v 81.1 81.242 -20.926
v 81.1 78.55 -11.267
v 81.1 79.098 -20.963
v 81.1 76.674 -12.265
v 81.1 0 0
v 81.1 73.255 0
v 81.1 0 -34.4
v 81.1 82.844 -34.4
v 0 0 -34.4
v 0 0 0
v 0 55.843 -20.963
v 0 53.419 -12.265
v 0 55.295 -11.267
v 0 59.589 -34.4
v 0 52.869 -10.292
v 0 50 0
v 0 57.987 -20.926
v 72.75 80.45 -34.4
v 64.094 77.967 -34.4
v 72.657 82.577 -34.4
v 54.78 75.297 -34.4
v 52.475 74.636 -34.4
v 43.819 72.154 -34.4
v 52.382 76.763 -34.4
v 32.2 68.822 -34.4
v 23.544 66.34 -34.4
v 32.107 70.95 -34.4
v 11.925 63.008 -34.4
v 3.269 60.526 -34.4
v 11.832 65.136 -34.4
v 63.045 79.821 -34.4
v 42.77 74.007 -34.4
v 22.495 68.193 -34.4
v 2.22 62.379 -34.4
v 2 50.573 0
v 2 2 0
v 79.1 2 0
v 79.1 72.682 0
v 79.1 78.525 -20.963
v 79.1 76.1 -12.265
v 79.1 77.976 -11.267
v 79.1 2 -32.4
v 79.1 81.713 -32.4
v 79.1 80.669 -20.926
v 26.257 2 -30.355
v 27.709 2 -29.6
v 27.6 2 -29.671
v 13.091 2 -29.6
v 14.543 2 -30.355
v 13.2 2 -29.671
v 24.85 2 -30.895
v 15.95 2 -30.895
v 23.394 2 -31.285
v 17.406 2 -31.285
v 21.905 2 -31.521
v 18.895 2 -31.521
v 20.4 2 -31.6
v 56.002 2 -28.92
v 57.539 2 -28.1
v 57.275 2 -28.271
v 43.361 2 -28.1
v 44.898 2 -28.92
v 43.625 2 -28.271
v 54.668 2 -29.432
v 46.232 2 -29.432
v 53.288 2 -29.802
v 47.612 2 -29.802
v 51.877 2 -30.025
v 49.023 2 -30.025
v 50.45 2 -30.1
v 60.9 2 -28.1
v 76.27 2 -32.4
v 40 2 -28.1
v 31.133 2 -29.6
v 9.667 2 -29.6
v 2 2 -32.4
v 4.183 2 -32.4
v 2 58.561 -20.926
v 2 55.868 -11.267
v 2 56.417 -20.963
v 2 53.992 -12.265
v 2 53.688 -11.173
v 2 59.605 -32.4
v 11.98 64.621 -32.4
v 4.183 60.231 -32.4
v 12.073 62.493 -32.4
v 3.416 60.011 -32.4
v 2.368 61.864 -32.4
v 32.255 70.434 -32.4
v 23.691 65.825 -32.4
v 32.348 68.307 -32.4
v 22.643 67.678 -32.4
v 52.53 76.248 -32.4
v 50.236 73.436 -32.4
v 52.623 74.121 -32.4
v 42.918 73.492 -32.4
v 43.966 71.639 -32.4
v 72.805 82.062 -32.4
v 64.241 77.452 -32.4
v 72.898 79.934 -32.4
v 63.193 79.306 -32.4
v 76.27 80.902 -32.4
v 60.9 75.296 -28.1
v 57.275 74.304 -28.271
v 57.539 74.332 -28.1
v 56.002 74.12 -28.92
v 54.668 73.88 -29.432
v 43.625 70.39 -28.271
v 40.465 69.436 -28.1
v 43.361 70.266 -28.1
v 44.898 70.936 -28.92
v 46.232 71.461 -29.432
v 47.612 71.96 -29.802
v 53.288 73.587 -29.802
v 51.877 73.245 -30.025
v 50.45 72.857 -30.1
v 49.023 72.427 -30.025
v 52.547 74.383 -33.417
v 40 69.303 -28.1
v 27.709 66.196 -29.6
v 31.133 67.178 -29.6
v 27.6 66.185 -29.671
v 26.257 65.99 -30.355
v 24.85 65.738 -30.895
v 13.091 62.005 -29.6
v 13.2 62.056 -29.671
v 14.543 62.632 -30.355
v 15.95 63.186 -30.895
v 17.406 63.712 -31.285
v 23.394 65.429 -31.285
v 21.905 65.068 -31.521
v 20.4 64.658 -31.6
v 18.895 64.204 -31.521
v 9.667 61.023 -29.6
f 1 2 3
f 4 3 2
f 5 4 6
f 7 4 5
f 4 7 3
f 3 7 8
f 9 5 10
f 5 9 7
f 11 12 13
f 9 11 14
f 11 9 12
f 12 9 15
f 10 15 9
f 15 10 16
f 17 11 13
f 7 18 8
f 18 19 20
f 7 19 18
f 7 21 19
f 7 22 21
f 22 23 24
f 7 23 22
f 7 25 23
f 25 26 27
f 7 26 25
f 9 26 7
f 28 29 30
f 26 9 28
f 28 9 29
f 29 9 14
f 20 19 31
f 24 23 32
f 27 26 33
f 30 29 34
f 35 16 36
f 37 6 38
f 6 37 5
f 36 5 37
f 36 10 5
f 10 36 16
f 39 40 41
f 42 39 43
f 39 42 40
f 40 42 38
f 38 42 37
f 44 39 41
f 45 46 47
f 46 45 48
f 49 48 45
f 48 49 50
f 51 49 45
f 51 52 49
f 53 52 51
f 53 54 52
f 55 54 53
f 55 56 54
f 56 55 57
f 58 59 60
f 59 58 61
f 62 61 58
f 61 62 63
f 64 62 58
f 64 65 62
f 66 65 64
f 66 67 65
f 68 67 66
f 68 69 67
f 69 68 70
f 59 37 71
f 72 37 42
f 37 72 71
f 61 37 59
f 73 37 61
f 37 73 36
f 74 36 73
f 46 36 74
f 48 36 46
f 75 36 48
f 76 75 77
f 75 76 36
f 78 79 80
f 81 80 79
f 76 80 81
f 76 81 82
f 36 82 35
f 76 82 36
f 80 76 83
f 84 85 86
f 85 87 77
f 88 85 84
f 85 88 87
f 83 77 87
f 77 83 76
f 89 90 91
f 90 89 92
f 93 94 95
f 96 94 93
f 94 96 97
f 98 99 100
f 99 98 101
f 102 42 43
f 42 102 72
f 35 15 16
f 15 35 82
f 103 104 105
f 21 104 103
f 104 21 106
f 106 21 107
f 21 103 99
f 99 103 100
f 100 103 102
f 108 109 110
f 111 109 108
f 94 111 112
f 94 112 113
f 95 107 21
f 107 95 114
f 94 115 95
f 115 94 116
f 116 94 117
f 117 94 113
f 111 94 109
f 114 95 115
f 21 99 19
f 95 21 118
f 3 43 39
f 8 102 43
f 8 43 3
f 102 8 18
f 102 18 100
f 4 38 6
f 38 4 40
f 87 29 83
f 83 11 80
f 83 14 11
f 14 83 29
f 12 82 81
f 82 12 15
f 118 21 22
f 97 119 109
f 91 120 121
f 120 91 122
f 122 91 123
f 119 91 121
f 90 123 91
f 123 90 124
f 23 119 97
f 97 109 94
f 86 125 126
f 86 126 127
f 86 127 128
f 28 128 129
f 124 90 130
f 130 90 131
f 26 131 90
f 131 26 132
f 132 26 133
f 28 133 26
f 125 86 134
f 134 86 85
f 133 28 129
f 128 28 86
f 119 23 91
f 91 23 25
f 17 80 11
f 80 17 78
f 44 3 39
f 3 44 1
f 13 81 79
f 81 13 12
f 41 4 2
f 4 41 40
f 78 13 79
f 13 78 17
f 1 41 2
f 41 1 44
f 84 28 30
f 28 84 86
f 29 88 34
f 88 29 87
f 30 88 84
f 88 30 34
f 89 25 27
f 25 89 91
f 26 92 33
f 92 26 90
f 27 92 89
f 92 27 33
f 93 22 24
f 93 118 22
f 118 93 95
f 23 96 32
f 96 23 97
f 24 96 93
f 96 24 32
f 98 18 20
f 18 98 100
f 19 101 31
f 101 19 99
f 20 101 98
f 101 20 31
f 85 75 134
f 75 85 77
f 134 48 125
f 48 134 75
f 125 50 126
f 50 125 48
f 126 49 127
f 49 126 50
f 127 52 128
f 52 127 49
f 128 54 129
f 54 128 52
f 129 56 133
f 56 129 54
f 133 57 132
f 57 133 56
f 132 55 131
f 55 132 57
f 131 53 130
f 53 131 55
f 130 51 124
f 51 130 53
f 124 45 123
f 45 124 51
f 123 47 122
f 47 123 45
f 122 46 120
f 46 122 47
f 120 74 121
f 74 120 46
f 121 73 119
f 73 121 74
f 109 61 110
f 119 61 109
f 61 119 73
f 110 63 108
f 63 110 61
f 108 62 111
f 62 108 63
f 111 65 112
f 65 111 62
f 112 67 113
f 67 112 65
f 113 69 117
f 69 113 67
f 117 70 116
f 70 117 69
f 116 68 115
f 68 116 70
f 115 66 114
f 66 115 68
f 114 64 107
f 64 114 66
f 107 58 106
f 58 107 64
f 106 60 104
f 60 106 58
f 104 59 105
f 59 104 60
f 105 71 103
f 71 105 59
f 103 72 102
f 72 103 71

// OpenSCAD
/* [General] */

// Choose a currency you use.
currency = "other"; // [usd:USD - US dollar, eur:EUR - Euro, chf:CHF - Swiss franc, cad:CAD - Canadian dollar, thb:THB - Thai Baht, other:Other (See "Slot customization" tab above)]

// How tall is the the shortest tube? In millimeters:
height = 50; // [10:150]

// Choose a pattern for the back side.
pattern = "no"; // [no:Solid without pattern, chncoin:Chinese ancient coin pattern, mesh:Mesh pattern]

// Would you like Tom-and-Jerry pictures on the left side and right side? (Not fully supported; may only work with OpenSCAD version 2014.09 ~ 2014.12.)
image = 0; //// [1:Yes please, 0:No thanks]

// Which one would you like to see?
part = "basebox"; // [all:All these three parts assembled together,all_unassembled:All these three parts unassembled,basebox:Base box only,topboard:Top board only,tubes:Tubes only]

/* [Slot customization] */

// In this tab you're able to customize your coins. Here below, you may have up to 10 slots, each for one kind of coin. For each slot you're going to define it's diameter and thickness. Note that the coins should be ordered from biggest to smallest in diameter. You may want to collect information about the diameters and thicknesses of your coins from wikipedia before you continue.
understand = 1; // [1:Yes I understand,0:Yes I said understand]

// in millimeters. For the first (and biggest) coin.
coin_1_diameter = 28;
// in millimeters.
coin_1_thickness = 1.8;
// The second coin. Remember: this 2nd coin should always be smaller than the 1st coin.
coin_2_diameter = 26.50;
coin_2_thickness = 1.75;
// The 3rd coin.
coin_3_diameter = 0;
coin_3_thickness = 0;
// 4th coin.
coin_4_diameter = 0;
coin_4_thickness = 0;
// 5th coin. If you don't need more coins, simply set the remaining to 0.
coin_5_diameter = 0;
coin_5_thickness = 0;
// 6th coin.
coin_6_diameter = 0;
coin_6_thickness = 0;
// 7th coin.
coin_7_diameter = 0;
coin_7_thickness = 0;
// 8th coin.
coin_8_diameter = 0;
coin_8_thickness = 0;
// 9th coin.
coin_9_diameter = 0;
coin_9_thickness = 0;
// 10th coin.
coin_10_diameter = 0;
coin_10_thickness = 0;

/* [Hidden] */

usd_coins = [[30.61, 26.50, 24.26, 21.21, 19.05, 17.91],
             [ 2.15,  2.00,  1.75,  1.95,  1.55,  1.35]];
eur_coins = [[25.75, 24.25, 23.25, 22.25, 21.25, 19.75, 18.75, 16.25],
             [ 2.20,  2.38,  2.33,  2.14,  1.67,  1.93,  1.67,  1.67]];
chf_coins = [[31.45, 27.40, 23.20, 21.05, 19.15, 18.20, 17.15],
             [ 2.35,  2.15,  1.15,  1.65,  1.45,  1.25,  1.25]];
cad_coins = [[28.00, 27.13, 26.50, 23.88, 21.20, 19.05, 18.03],
             [ 1.80,  1.95,  1.75,  1.58,  1.76,  1.45,  1.22]];
thb_coins = [[26.00, 24.05, 22.05, 20.01],
             [ 2.16,  2.13,  1.48,  1.38]];

other_coins_d_t = [
  [coin_1_diameter, coin_1_thickness], [coin_2_diameter, coin_2_thickness],
  [coin_3_diameter, coin_3_thickness], [coin_4_diameter, coin_4_thickness],
  [coin_5_diameter, coin_5_thickness], [coin_6_diameter, coin_6_thickness],
  [coin_7_diameter, coin_7_thickness], [coin_8_diameter, coin_8_thickness],
  [coin_9_diameter, coin_9_thickness], [coin_10_diameter, coin_10_thickness]];

other_coins = [[for (i=other_coins_d_t) if(i[0] > 0) i[0]],
               [for (i=other_coins_d_t) if(i[0] > 0) i[1]]];


//  .88b  d88.   .d8b.   d888888b  d8b   db
//  88'YbdP`88  d8' `8b    `88'    888o  88
//  88  88  88  88ooo88     88     88V8o 88
//  88  88  88  88~~~88     88     88 V8o88
//  88  88  88  88   88    .88.    88  V888
//  YP  YP  YP  YP   YP  Y888888P  VP   V8P

coins = currency == "usd" ? usd_coins :
        currency == "eur" ? eur_coins :
        currency == "chf" ? chf_coins :
        currency == "cad" ? cad_coins :
        currency == "thb" ? thb_coins : other_coins;

coins_d = coins[0];
coins_thickness = coins[1];

enable_box = (part == "all" || part == "all_unassembled" || part == "basebox");
  enable_dovetail = true;
  enable_box_emptier = false;
  enable_mesh = (pattern != "no");
  enable_image = (image == 1);
enable_top_board = (part == "all" || part == "all_unassembled" || part == "topboard");
enable_tubes = (part == "all" || part == "all_unassembled" || part == "tubes");
  enable_tube_scale = true;
  enable_tube_emptier = false;
  inspect_tube_inside = false;
assembled = (part != "all_unassembled");
lay_flat = (part != "all" && part != "all_unassembled");

sorter_min_height = height;
board_thickness = 2.0;
board_left_padding = 2;
board_right_padding = 13;
board_primary_slope = 16;
board_secondary_slope = 15;
horizontal_guard_width = 3;
coin_padding = 0.4;
coin_padding_top_board = 0.25;
nozzle_size = 0.4;
nozzle_size_upbound = 0.41;

dovetail_count = 4;
dovetail_back_max_width = 10;
dovetail_back_min_width = 9;
dovetail_side_max_width = 10;
dovetail_side_min_width = 9;
dovetail_femail_margin = 0.5;

image_left_size = 25;
image_right_size = 30;
image_dir = "";

tubes_shorter = 5;
tubes_front_back_cut = 2;
tubes_base_thickness = 4.0;
tubes_back_thinner = 1;
tubes_scale_depth = 0.4;
tubes_scale_height = 0.8;

unassembled_top_board_lift = 25;
unassembled_tubes_lift = 20;

$fa = 6;  // default: 12
$fs = 1;  // default: 2

coin_count = len(coins_d);
coin_max_index = coin_count - 1;

board_length = (board_left_padding + board_right_padding
                + sum_coins_d()
                + coin_padding * coin_count * 2
                + board_thickness * (coin_count + 3));

board_width = coins_d[0] + coin_padding + board_thickness * 3;

slope_height = tan(board_secondary_slope) * board_width
               + tan(board_primary_slope) * board_length;

sorter_max_height = sorter_min_height + slope_height + board_thickness;
echo("board_length:", board_length);
echo("board_width:", board_width);
echo("sorter_min_height:", sorter_min_height);
echo("sorter_max_height:", sorter_max_height);

main();

module main() {
  top_board_lift = assembled ? 0 : unassembled_top_board_lift;
  tubes_lift = assembled ? 0 : unassembled_tubes_lift;
  if (lay_flat) {
    main_impl_flat(top_board_lift, tubes_lift);
  } else {
    main_impl(top_board_lift, tubes_lift);
  }
}
module main_impl(top_board_lift=0, tubes_lift=0) {
  if (enable_box) {
    base_box();
  }
  if (enable_top_board) {
    translate([0, 0, top_board_lift]) top_board();
  }
  if (enable_tubes) {
    translate([0, 0, tubes_lift]) tubes();
  }
}
module main_impl_flat(top_board_lift=0, tubes_lift=0) {
  if (enable_box) {
    rotate([-90, 0, 0]) base_box();
  }
  if (enable_top_board) {
    translate([0, 0, top_board_lift])
    untransform_top_board(sorter_min_height)
    top_board();
  }
  if (enable_tubes) {
    translate([0, 0, tubes_lift]) tubes();
  }
}


//  d8888b.  .d8b.  .d8888. d88888b      d8888b.  .d88b.  db    db
//  88  `8D d8' `8b 88'  YP 88'          88  `8D .8P  Y8. `8b  d8'
//  88oooY' 88ooo88 `8bo.   88ooooo      88oooY' 88    88  `8bd8'
//  88~~~b. 88~~~88   `Y8b. 88~~~~~      88~~~b. 88    88  .dPYb.
//  88   8D 88   88 db   8D 88.          88   8D `8b  d8' .8P  Y8.
//  Y8888P' YP   YP `8888Y' Y88888P      Y8888P'  `Y88P'  YP    YP

// Component: the box.
module base_box() {
  render(convexity=2)
  difference() {
    union() {
      box_empty();
    }
    if (enable_image) {
      image_left_subtraction();
      image_right_subtraction();
    }
    if (enable_mesh) {
      board_back_hollow(board_thickness * 1.5);
    }
    if (enable_box_emptier) {
      board_left_hollow(fatter=board_thickness * 1.5,
                        thicker=-nozzle_size_upbound * 2);
      board_right_hollow(fatter=board_thickness * 1.5,
                         thicker=-nozzle_size_upbound * 2);
      board_bottom_hollow(fatter=board_thickness * 2,
                          thicker=-nozzle_size_upbound * 2);
    }
  }

  if (enable_dovetail) {
    base_box_dovetails();
  }

  if (enable_image) {
    image_left();
    image_right();
  }

  if (enable_mesh) {
    intersection() {
      board_back_mesh();
      union() {
        board_back_hollow();
        box_back_fill();
      }
    }
  } else {
    box_back_fill();
  }
}

function box_size(fatter=0, thicker=0, altitude=0, fronter=0, taller=0) =
  [board_length + fatter*2 + thicker*2,
   board_width + fatter*2 + thicker*2 + fronter,
   sorter_max_height + fatter*2 + thicker*2 + taller];

module box_move(fatter=0, thicker=0, altitude=0, fronter=0, taller=0) {
  translate([-fatter-thicker,
             -fatter-thicker-fronter,
             altitude-fatter-thicker]) {
    children();
  }
}

module box_empty() {
  cut_top_side() {
    box_empty_tall();
  }
}
module box_empty_tall(fatter=0, thicker=0, altitude=0) {
  difference() {
    box_outer_solid_tall(fatter, thicker, altitude);
    box_inner_solid_tall(fatter, thicker, altitude);
  }
}
module box_outer_solid_tall(fatter=0, thicker=0, altitude=0,
                            fronter=0, taller=0) {
  box_move(fatter, thicker, altitude, fronter, taller) {
    cube(box_size(fatter, thicker, altitude, fronter, taller));
  }
}
module box_inner_solid_tall(fatter=0, thicker=0, altitude=0) {
  box_outer_solid_tall(
      fatter - board_thickness - thicker, thicker, altitude,
      board_thickness + thicker + 0.1,
      board_thickness + thicker + 0.1);
}

module board_back_hollow(thicker=0) {
  xyz = box_size(fatter = -board_thickness - thicker);
  cut_top_side(altitude = -thicker)
  box_move(fatter = -board_thickness - thicker)
  translate([0, xyz[1] + thicker/2, 0]) {
    cube([xyz[0], board_thickness + thicker, xyz[2]]);
  }
}
module box_back_fill(thicker=0) {
  cut_top_side(altitude = -thicker) {
    box_back_fill_tall();
  }
}
module box_back_fill_tall() {
  linear_extrude(height=sorter_max_height, center=false, convexity=2)
  translate([0, coin_padding*2])
  difference() {
    polygon(tube_cut_back_complete());
    for (i = [0 : coin_max_index]) {
      coin_hole_plain(i);
    }
  }
}

module board_left_hollow(fatter=0, thicker=0) {
  xyz = box_size(fatter = -board_thickness - fatter);
  cut_top_side(altitude = -fatter)
  box_move(fatter = -board_thickness - fatter)
  translate([-board_thickness - fatter - thicker/2, 0, 0]) {
    cube([board_thickness + thicker, xyz[1], xyz[2]]);
  }
}

module board_right_hollow(fatter=0, thicker=0) {
  xyz = box_size(fatter = -board_thickness - fatter);
  cut_top_side(altitude = -fatter)
  box_move(fatter = -board_thickness - fatter)
  translate([xyz[0] + fatter - thicker/2, 0, 0]) {
    cube([board_thickness + thicker, xyz[1], xyz[2]]);
  }
}

module board_bottom_hollow(fatter=0, thicker=0) {
  xyz = box_size(fatter = -board_thickness - fatter);
  box_move(fatter = -board_thickness - fatter)
  translate([0, 0, -board_thickness - fatter - thicker/2]) {
    cube([xyz[0], xyz[1], board_thickness + thicker]);
  }
}

// Transformation: cut the right, left, back and front side.
module cut_sides(fatter=0, thicker=0) {
  intersection() {
    union() {
      children();
    }
    box_outer_solid_tall(fatter, thicker, taller=sorter_max_height);
  }
}

module cut_top_side(fatter=0, thicker=0, altitude=0) {
  difference() {
    union() {
      children();
    }
    top_side(sorter_min_height + fatter + altitude);
  }
}


//  d888888b .88b  d88.  d888b        dD  .88b  d88. d88888b .d8888. db   db
//    `88'   88'YbdP`88 88' Y8b      d8'  88'YbdP`88 88'     88'  YP 88   88
//     88    88  88  88 88          d8'   88  88  88 88ooooo `8bo.   88ooo88
//     88    88  88  88 88  ooo    d8'    88  88  88 88~~~~~   `Y8b. 88~~~88
//    .88.   88  88  88 88. ~8~   d8'     88  88  88 88.     db   8D 88   88
//  Y888888P YP  YP  YP  Y888P   C8'      YP  YP  YP Y88888P `8888Y' YP   YP

module image_left() {
  translate([0, (board_width - image_left_size) / 2,
             sorter_min_height * 0.4 - image_left_size / 2]) {
    translate([1, image_left_size, image_left_size])
    rotate([0, -90, 0])
    rotate([0, 0, -90])
    mirror([0, 1, 0])
    resize([image_left_size, image_left_size, 1]) {
      surface(file = str(image_dir, "TomHead_gray.1.dat"), convexity = 2);
    }

    translate([0, image_left_size-0.1, 0]) {
      cube([1, (board_width - image_left_size) / 2 - board_thickness,
            image_left_size]);
    }
  }
}

module image_left_subtraction() {
  translate([0,
             (board_width - image_left_size) / 2 + 0.01,
             sorter_min_height * 0.4 - image_left_size / 2 + 0.01]) {
    cube([0.99, image_left_size - 0.02, image_left_size - 0.02]);
  }
}

module image_right() {
  translate([board_length - 1,
             (board_width - image_right_size) / 2,
             sorter_max_height * 0.37 - image_right_size / 2]) {
    translate([0, 0, image_right_size])
    rotate([0, 90, 0])
    rotate([0, 0, 90])
    mirror([0, 1, 0])
    resize([image_right_size, image_right_size, 1]) {
      surface(file = str(image_dir, "Jerry_bw.dat"), convexity = 2);
    }

    translate([0, image_right_size-0.1, 0]) {
      cube([1, (board_width - image_right_size) / 2 - board_thickness,
            image_right_size]);
    }
  }
}

module image_right_subtraction() {
  translate([board_length - 0.99,
             (board_width - image_right_size) / 2 + 0.01,
             sorter_max_height * 0.37 - image_right_size / 2 + 0.01]) {
    cube([1, image_right_size - 0.02, image_right_size - 0.02]);
  }
}

module board_back_mesh() {
  diag_len = sqrt(board_length * board_length +
                  sorter_max_height*sorter_max_height);

  if (pattern == "mesh") {
    board_back_mesh_grids(
        nozzle_size_upbound, 15, ceil(diag_len / 15) + 1, 45,
        [board_length / 2, board_width * 0.7, sorter_max_height / 2],
        "y", board_width);

  } else if (pattern == "chncoin") {
    board_back_mesh_ancient_coins(
        nozzle_size_upbound, 18, ceil(diag_len / 18 / 2) + 2,
        [board_length / 2, board_width * 0.7, sorter_max_height / 2],
        "y", board_width);
  }
}

module mesh_extrude(
    center=[0,0,0], normal_direction="z", height=10, convexity=10) {
  translate(center) {
    rotate(normal_direction=="x" ? [0,90,0] :
           normal_direction=="y" ? [-90,0,0] : [0,0,0]) {
      linear_extrude(height, center=true, convexity=convexity) {
        children();
      }
    }
  }
}

module board_back_mesh_grids(
    thickness, gap, count, rotate_angle=0,
    center=[0,0,0], normal_direction="z", height=10) {
  length = (thickness + gap) * (count - 1) + thickness;
  mesh_extrude(center, normal_direction, height, convexity=3)
  rotate([0, 0, rotate_angle])
  translate([-length/2, -length/2]) {
    for (i = [0 : count - 1]) {
      translate([(thickness + gap) * i, 0]) {
        square([thickness, length]);
      }
      translate([0, (thickness + gap) * i]) {
        square([length, thickness]);
      }
    }
  }
}

module board_back_mesh_ancient_coins(
    thickness, radius, count,
    center=[0,0,0], normal_direction="z", height=10) {
  sqrt2 = sqrt(2);
  mesh_extrude(center, normal_direction, height, convexity=3)
  translate([-sqrt2 * radius * (count - 1) / 2,
             -sqrt2 * radius * (count - 1) / 2]) {
    for (i = [0 : count - 1])
    for (j = [0 : count - 1]) {
      translate([sqrt2 * radius * i, sqrt2 * radius * j]) {
        render(convexity=2)
        difference() {
          circle(r=radius + thickness / 2);
          circle(r=radius - thickness / 2);
        }
      }
    }
  }
}


//  d888888b  .d88b.  d8888b.      d8888b.  .d88b.   .d8b.  d8888b. d8888b.
//  `~~88~~' .8P  Y8. 88  `8D      88  `8D .8P  Y8. d8' `8b 88  `8D 88  `8D
//     88    88    88 88oodD'      88oooY' 88    88 88ooo88 88oobY' 88   88
//     88    88    88 88~~~        88~~~b. 88    88 88~~~88 88`8b   88   88
//     88    `8b  d8' 88           88   8D `8b  d8' 88   88 88 `88. 88  .8D
//     YP     `Y88P'  88           Y8888P'  `Y88P'  YP   YP 88   YD Y8888D'

// Component: the solid board on top.
module top_board() {
  difference() {
    // the board itself
    cut_sides() {
      transform_top_board(sorter_min_height) {
        cube([board_length*2, board_width*2, board_thickness]);
      }
    }
    // the femail dovetails
    if (enable_dovetail) {
      top_board_dovetails();
    }

    // holes and cuts
    for (i = [0 : coin_max_index]) {
      coin_hole(i, bigger_r=coin_padding_top_board-coin_padding);
      slope_cut_for_coin(i, bigger_r=coin_padding_top_board-coin_padding);
    }
  }

  vertical_guard();
  horizontal_guard();
}

// Component: the guard on top of the top board.
module vertical_guard() {
  difference() {
    intersection() {
      cube([board_length, board_thickness, sorter_max_height * 2]);
      top_side(sorter_min_height + board_thickness - 0.1);
    }
    top_side(sorter_min_height + board_thickness * 2);
  }
}

// Component: the guard crossing the holes.
module horizontal_guard() {
  // should be similar to top_board()
  cut_sides()
  transform_top_board(sorter_min_height) {
    cube([board_length*2,
          horizontal_guard_width + board_thickness,
          board_thickness]);
  }
}

// Submodule: the upper solid box that is rotated the same as the top board.
module top_side(altitude = 0) {
  // rotate it and raise it
  transform_top_board(altitude) {
    // a big box
    translate([-board_length/2, -board_width/5, 0]) {
      cube([board_length*2, board_width*2, sorter_max_height]);
    }
  }
}

// Transformation: do the rotation.
module transform_top_board(lift_z=0) {
  translate([0, 0, lift_z]) {
    rotate(a=board_secondary_slope, v=[1, 0, tan(board_primary_slope)])
    rotate([0, -board_primary_slope, 0]) {
      children();
    }
  }
}

module untransform_top_board(lift_z=0) {
  rotate([0, board_primary_slope, 0])
  rotate(a=-board_secondary_slope, v=[1, 0, tan(board_primary_slope)]) {
    translate([0, 0, -lift_z]) {
      children();
    }
  }
}


//  d8888b.  .d88b.  db    db d88888b d888888b  .d8b.  d888888b db
//  88  `8D .8P  Y8. 88    88 88'     `~~88~~' d8' `8b   `88'   88
//  88   88 88    88 Y8    8P 88ooooo    88    88ooo88    88    88
//  88   88 88    88 `8b  d8' 88~~~~~    88    88~~~88    88    88
//  88  .8D `8b  d8'  `8bd8'  88.        88    88   88   .88.   88booo.
//  Y8888D'  `Y88P'     YP    Y88888P    YP    YP   YP Y888888P Y88888P

// Component: male dovetails on the base box
module base_box_dovetails() {
  render()
  intersection() {
    all_male_dovetails_too_long();
    box_empty_tall();
  }
}

// Component: female dovetails on the top board
module top_board_dovetails() {
  render()
  intersection() {
    all_female_dovetails_too_long();
    box_empty_tall(thicker=dovetail_femail_margin);
  }
}

// Submodule: a male dovetail.
module my_male_dovetail(
    rotate_x, rotate_y, rotate_z, thickness, max_width, min_width) {
  rotate([rotate_x, rotate_y, rotate_z]) {
    translate([0, -0.01, 0]) {
      male_dovetail(
          max_width=max_width, min_width=min_width,
          depth=board_thickness+0.01, height=thickness,
          cutout_width=0, cutout_depth=0);
    }
  }
}

// Submodule: a female dovetail.
module my_female_dovetail(
    rotate_x, rotate_y, rotate_z, thickness, max_width, min_width) {
  rotate([rotate_x, rotate_y, rotate_z]) {
    translate([0, -0.01, 0]) {
      female_dovetail_negative(
          max_width=max_width, min_width=min_width,
          depth=board_thickness+0.02, height=thickness,
          clearance=dovetail_femail_margin);
    }
  }
}

// Submodule: all the too-long male dovetail on the base box
module all_male_dovetails_too_long() {
  transform_top_board(sorter_min_height) {
    translate([0, board_width / 2, 0]) {
      my_male_dovetail(90, 0, 90, board_length * 2,
                       dovetail_side_max_width, dovetail_side_min_width);
    }
    for (i = [1 : dovetail_count]) {
      translate([
          board_length * (i-0.5) / dovetail_count / cos(board_primary_slope),
          board_width + board_thickness,
          0]) {
        my_male_dovetail(90, 0, 0, board_thickness * 2,
                         dovetail_back_max_width, dovetail_back_min_width);
      }
    }
  }
}

// Submodule: all the too-long female dovetail on the top board
module all_female_dovetails_too_long() {
  transform_top_board(sorter_min_height) {
    translate([0, board_width / 2, 0]) {
      my_female_dovetail(90, 0, 90, board_length * 2,
                         dovetail_side_max_width, dovetail_side_min_width);
    }
    for (i = [1 : dovetail_count]) {
      translate([
          board_length * (i-0.5) / dovetail_count / cos(board_primary_slope),
          board_width + board_thickness * 2,
          0]) {
        my_female_dovetail(90, 0, 0, board_thickness * 4,
                           dovetail_back_max_width, dovetail_back_min_width);
      }
    }
  }
}


//   .o88b.  .d88b.  d888888b d8b   db       .o88b. db    db d888888b
//  d8P  Y8 .8P  Y8.   `88'   888o  88      d8P  Y8 88    88 `~~88~~'
//  8P      88    88    88    88V8o 88      8P      88    88    88
//  8b      88    88    88    88 V8o88      8b      88    88    88
//  Y8b  d8 `8b  d8'   .88.   88  V888      Y8b  d8 88b  d88    88
//   `Y88P'  `Y88P'  Y888888P VP   V8P       `Y88P' ~Y8888P'    YP

// Submodule: the coin holes.
module coin_hole(n, bigger_r=0) {
  translate([coin_center_x(n), coin_center_y(n), board_thickness+0.1]) {
    cylinder(h = sorter_max_height,
             r = coins_d[n] / 2 + coin_padding + bigger_r);
  }
}

// Submodule: the coin holes, in a plain.
module coin_hole_plain(n) {
  translate([coin_center_x(n), coin_center_y(n)]) {
    circle(coins_d[n] / 2 + coin_padding);
  }
}

// Submodule: the solid tube, in a plain.
module coin_hole_plain_thicker(n) {
  translate([coin_center_x(n), coin_center_y(n)]) {
    circle(coins_d[n] / 2 + coin_padding + board_thickness);
  }
}

// Submodule: the slope cuts.
module slope_cut_for_coin(n, bigger_r=0) {
  render(convexity=2) {
    intersection() {
      // the (too big) actual slope cut
      transform_top_board(sorter_min_height) {
        a = board_primary_slope;
        th = board_thickness;
        cut_length = coins_d[n] * 1.5;
        move_x = coin_left_x(n+1) - cut_length;
        cut_length_rotated = cut_length / cos(a);
        move_x_rotated = move_x / cos(a) + th * tan(a) + 1;

        translate([move_x_rotated, 0, 0]) {  // move rightwards
          // make a triangle-box
          rotate([0, -atan(th / cut_length_rotated), 0]) {
            cube([cut_length_rotated * 2, board_width, th * 2]);
          }
        }  // translate, move rightwards
      }  // transform_top_board

      // limiting box
      translate([coin_center_x(n), 1, 0]) {
        cube([coins_d[0],
              coin_top_y(n) - 1 + bigger_r,
              sorter_max_height]);
      }
    }
  }
}

//   .o88b.  .d88b.  d888888b d8b   db      d888888b db    db d8888b. d88888b
//  d8P  Y8 .8P  Y8.   `88'   888o  88      `~~88~~' 88    88 88  `8D 88'
//  8P      88    88    88    88V8o 88         88    88    88 88oooY' 88ooooo
//  8b      88    88    88    88 V8o88         88    88    88 88~~~b. 88~~~~~
//  Y8b  d8 `8b  d8'   .88.   88  V888         88    88b  d88 88   8D 88.
//   `Y88P'  `Y88P'  Y888888P VP   V8P         YP    ~Y8888P' Y8888P' Y88888P

// Component: the tubes.
module tubes() {
  linear_extrude(height=tubes_base_thickness+0.01, center=false, convexity=2) {
    tube_base_2();
  }
  difference() {
    translate([0, 0, tubes_base_thickness]) {

      if (enable_tube_emptier) {
        intersection() {
          tube_body_3();
          tube_stronger();
        }

        if (!inspect_tube_inside) {
          tube_body_4();
          if (enable_tube_scale) {
            intersection() {
              tube_body_3();
              tube_scale_replenishment();
            }
          }
        }

      } else {  // !enable_tube_emptier
        tube_body_3();
      }
    }

    if (enable_tube_scale) {
      translate([0, 0, tubes_base_thickness]) {
        tube_scales();
      }
    }
    translate([0, -1, sorter_min_height - tubes_shorter]) {
      rotate([0, -board_primary_slope, 0]) {
        cube([board_length * 2, board_width * 2, sorter_max_height]);
      }
    }
  }
}

// Submodule: the "last coins" and the tube connecting part.
module tube_base_2() {
  polygon(concat(
      [[tube_cut_x_x(0)[0], tube_front_cut_y()],
       [tube_left_x(), tube_front_y()],
       [tube_left_x()+tubes_back_thinner, tube_back_y()]],
      tube_cut_back_xys(),
      [[tube_right_x()-tubes_back_thinner, tube_back_y()],
       [tube_right_x(), tube_front_y()],
       [tube_cut_x_x(coin_max_index)[1], tube_front_cut_y()]]));
}

// Submodule: the tube connecting part subtracted by coin holes.
module tube_base_3() {
  difference() {
    tube_base_2();
    for (i = [0 : coin_max_index]) {
      coin_hole_plain(i);
    }
  }
}

// Submodule: the empty tube_base_3.
module tube_base_4() {
  difference() {
    tube_base_3();
    offset(delta = -nozzle_size_upbound) {
      tube_base_3();
    }
  }
}

module tube_body_3() {
  linear_extrude(height=sorter_max_height, center=false, convexity=2) {
    tube_base_3();
  }
}

module tube_body_4() {
  linear_extrude(height=sorter_max_height, center=false, convexity=2) {
    tube_base_4();
  }
}

module tube_stronger() {
  for (i = [0 : coin_max_index]) {
    x = coin_center_x(i);
    r = coins_d[i] / 2 + coin_padding;

    translate([x, coin_center_y(i), 0]) {
      cylinder(h = tube_height_at(x) * 0.33,
               r1 = r + board_thickness * 0.7,
               r2 = r + nozzle_size);
    }

    translate([x, coin_center_y(i), tube_height_at(x) * 0.67]) {
      cylinder(h = tube_height_at(x) * 0.4,
               r2 = r + board_thickness * 0.7,
               r1 = r + nozzle_size);
    }
  }

  translate([0, board_width, 0])
  rotate([90, 0, 0]) {
    th = board_thickness;

    linear_extrude(height=board_width, convexity=2) {
      polygon([
          [0, -0.1],
          [0, tube_connection_height(0) * 0.55],
          [coin_left_x(0) - th/2, th],
          [coin_left_x(coin_max_index) - th/2, th],
          [board_length - th*3, th],
          [board_length, tube_connection_height(coin_max_index) * 0.55],
          [board_length, -0.1],
      ]);
    }

    linear_extrude(height=board_width, convexity=2) {
      polygon([
          tube_x_height_at(0, 0.1),
          [0, tube_connection_height(0) * 0.45 - th],
          tube_x_height_at(coin_left_x(0) - th/2, -th),
          tube_x_height_at(coin_left_x(coin_max_index) - th/2, -th),
          tube_x_height_at(board_length - th*3, -th),
          [board_length, tube_connection_height(coin_max_index) * 0.50 - th],
          tube_x_height_at(board_length, 0.1),
      ]);
    }
  }
}

module tube_scales() {
  for (i = [0 : coin_max_index]) {
    render(convexity=2) {
      interval = (coins_thickness[i] > 1.5 ? 1 : 2);
      for (j = [interval : interval : sorter_max_height/coins_thickness[i]]) {
        translate([coin_center_x(i),
                   tube_front_cut_y() - 1,
                   j * coins_thickness[i] - tubes_scale_height / 2]) {
          length_offset = (j%10==0 ? 3 : j%2==0 ? 1 : -0.5);
          cube([tube_cut_half_width(i) + length_offset,
                tubes_scale_depth + 1,
                tubes_scale_height]);
        }
      }
    }
  }
}

module tube_scale_replenishment() {
  for (i = [0 : coin_max_index]) {
    translate([coin_center_x(i), tube_front_cut_y() - 1, 0]) {
      cube([tube_cut_half_width(i) + 3 + nozzle_size,
            tubes_scale_depth + 1 + nozzle_size,
            sorter_max_height]);
    }
  }
}


//  d88888b  db    db  d8b   db   .o88b.  .d8888.
//  88'      88    88  888o  88  d8P  Y8  88'  YP
//  88ooo    88    88  88V8o 88  8P       `8bo.
//  88~~~    88    88  88 V8o88  8b         `Y8b.
//  88       88b  d88  88  V888  Y8b  d8  db   8D
//  YP       ~Y8888P'  VP   V8P   `Y88P'  `8888Y'

// Accumulated coins' diameters.
function sum_coins_d(first_n=coin_count) =
  first_n <= 0 ? 0 :
  coins_d[first_n - 1] + sum_coins_d(first_n - 1);

// Coin positions.
function coin_center_x(n) =
  coin_left_x(n) + coins_d[n] / 2;

function coin_left_x(n) =
  board_left_padding + sum_coins_d(n)
  + coin_padding * (2 * n + 1)
  + board_thickness * (n + 2);

function coin_center_y(n) =
  coins_d[n] / 2 + coin_padding + board_thickness;

function coin_top_y(n) =
  coin_center_y(n) + coins_d[n] / 2 + coin_padding;

function coin_bottom_y(n) =
  coin_center_y(n) - coins_d[n] / 2 - coin_padding;

// Tube cuts.
function tube_left_x() = board_thickness + coin_padding;
function tube_right_x() = board_length - board_thickness - coin_padding;
function tube_front_y() = coin_padding;
function tube_back_y() = board_width - board_thickness - coin_padding;
function tube_front_cut_y() = coin_bottom_y(0) + tubes_front_back_cut;

function tube_cut_half_width(n) =
  sqrt(pow(coins_d[n] / 2 + coin_padding + board_thickness, 2)
       - pow(coins_d[n] / 2 + coin_padding - tubes_front_back_cut, 2));

function tube_cut_x_x(n) =
  [coin_center_x(n) - tube_cut_half_width(n),
   coin_center_x(n) + tube_cut_half_width(n)];

function tube_cut_back_xy_xy(n) =
  [[coin_center_x(n) - tube_cut_half_width(n),
    coin_top_y(n) - tubes_front_back_cut],
   [coin_center_x(n) + tube_cut_half_width(n),
    coin_top_y(n) - tubes_front_back_cut]];

function tube_cut_back_xys(first_n=coin_count) =
  first_n <= 0 ? [] :
  concat(tube_cut_back_xys(first_n - 1),
         tube_cut_back_xy_xy(first_n - 1));

function tube_cut_back_complete() =
  concat([[tube_left_x()+tubes_back_thinner, tube_back_y()]],
         tube_cut_back_xys(),
         [[tube_right_x()-tubes_back_thinner, tube_back_y()]]);

// Tube connections.
function tube_height_at(x) =
  sorter_min_height - tubes_shorter - tubes_base_thickness
  + x * tan(board_primary_slope);

function tube_x_height_at(x, z_delta=0) =
  [x, tube_height_at(x) + z_delta];

function tube_connection_height(n) =
  sorter_min_height - tubes_shorter - tubes_base_thickness + (
    n == 0 ? 0:
    coin_center_x(n-1) * tan(board_primary_slope));


// From: https://github.com/hugokernel/OpenSCAD_Dovetail.git
//
//  d8888b.  .d88b.  db    db d88888b d888888b  .d8b.  d888888b db
//  88  `8D .8P  Y8. 88    88 88'     `~~88~~' d8' `8b   `88'   88
//  88   88 88    88 Y8    8P 88ooooo    88    88ooo88    88    88
//  88   88 88    88 `8b  d8' 88~~~~~    88    88~~~88    88    88
//  88  .8D `8b  d8'  `8bd8'  88.        88    88   88   .88.   88booo.
//  Y8888D'  `Y88P'     YP    Y88888P    YP    YP   YP Y888888P Y88888P

module female_dovetail_negative(max_width=11, min_width=5, depth=5, height=30, clearance=0.25) {
  union() {
    translate([0,-0.001,-0.05])
      dovetail_3d(max_width+clearance,min_width+clearance,depth,height+0.1);
      translate([-(max_width+clearance)/2, depth-0.002,-0.5])
        cube([max_width+clearance,clearance/2,height+1]);
  }
}

module female_dovetail(max_width=11, min_width=5, depth=5, height=30, block_width=15, block_depth=9, clearance=0.25) {
    difference() {
      translate([-block_width/2,0,0]) cube([block_width, block_depth, height]);
      female_dovetail_negative(max_width, min_width, depth, height, clearance);
    }
}

module male_dovetail(max_width=11, min_width=5, depth=5, height=30, cutout_width=5, cutout_depth=3.5) {
  difference() {
    dovetail_3d(max_width,min_width,depth,height);
    translate([0.001,depth+0.001,-0.05])
      dovetail_cutout(cutout_width, cutout_depth, height+0.1);
  }
}

module dovetail_3d(max_width=11, min_width=5, depth=5, height=30) {
  linear_extrude(height=height, convexity=2)
    dovetail_2d(max_width,min_width,depth);
}

module dovetail_2d(max_width=11, min_width=5, depth=5) {
  angle=atan((max_width/2-min_width/2)/depth);
  //echo("angle: ", angle);
  polygon(paths=[[0,1,2,3]], points=[[-min_width/2,0], [-max_width/2,depth], [max_width/2, depth], [min_width/2,0]]);
}

module dovetail_cutout(width=5, depth=4, height=30) {
  translate([0,-depth+width/2,0])
    union() {
      translate([-width/2,0,0])
        cube([width,depth-width/2,height]);
      difference() {
        cylinder(r=width/2, h=height, $fs=0.25);
        translate([-width/2-0.05,0.05,-0.05]) cube([width+0.1,width+0.1,height+0.1]);
      }
    }
}

// http://patorjk.com/software/taag/#p=display&c=c%2B%2B&f=Basic&t=abc
